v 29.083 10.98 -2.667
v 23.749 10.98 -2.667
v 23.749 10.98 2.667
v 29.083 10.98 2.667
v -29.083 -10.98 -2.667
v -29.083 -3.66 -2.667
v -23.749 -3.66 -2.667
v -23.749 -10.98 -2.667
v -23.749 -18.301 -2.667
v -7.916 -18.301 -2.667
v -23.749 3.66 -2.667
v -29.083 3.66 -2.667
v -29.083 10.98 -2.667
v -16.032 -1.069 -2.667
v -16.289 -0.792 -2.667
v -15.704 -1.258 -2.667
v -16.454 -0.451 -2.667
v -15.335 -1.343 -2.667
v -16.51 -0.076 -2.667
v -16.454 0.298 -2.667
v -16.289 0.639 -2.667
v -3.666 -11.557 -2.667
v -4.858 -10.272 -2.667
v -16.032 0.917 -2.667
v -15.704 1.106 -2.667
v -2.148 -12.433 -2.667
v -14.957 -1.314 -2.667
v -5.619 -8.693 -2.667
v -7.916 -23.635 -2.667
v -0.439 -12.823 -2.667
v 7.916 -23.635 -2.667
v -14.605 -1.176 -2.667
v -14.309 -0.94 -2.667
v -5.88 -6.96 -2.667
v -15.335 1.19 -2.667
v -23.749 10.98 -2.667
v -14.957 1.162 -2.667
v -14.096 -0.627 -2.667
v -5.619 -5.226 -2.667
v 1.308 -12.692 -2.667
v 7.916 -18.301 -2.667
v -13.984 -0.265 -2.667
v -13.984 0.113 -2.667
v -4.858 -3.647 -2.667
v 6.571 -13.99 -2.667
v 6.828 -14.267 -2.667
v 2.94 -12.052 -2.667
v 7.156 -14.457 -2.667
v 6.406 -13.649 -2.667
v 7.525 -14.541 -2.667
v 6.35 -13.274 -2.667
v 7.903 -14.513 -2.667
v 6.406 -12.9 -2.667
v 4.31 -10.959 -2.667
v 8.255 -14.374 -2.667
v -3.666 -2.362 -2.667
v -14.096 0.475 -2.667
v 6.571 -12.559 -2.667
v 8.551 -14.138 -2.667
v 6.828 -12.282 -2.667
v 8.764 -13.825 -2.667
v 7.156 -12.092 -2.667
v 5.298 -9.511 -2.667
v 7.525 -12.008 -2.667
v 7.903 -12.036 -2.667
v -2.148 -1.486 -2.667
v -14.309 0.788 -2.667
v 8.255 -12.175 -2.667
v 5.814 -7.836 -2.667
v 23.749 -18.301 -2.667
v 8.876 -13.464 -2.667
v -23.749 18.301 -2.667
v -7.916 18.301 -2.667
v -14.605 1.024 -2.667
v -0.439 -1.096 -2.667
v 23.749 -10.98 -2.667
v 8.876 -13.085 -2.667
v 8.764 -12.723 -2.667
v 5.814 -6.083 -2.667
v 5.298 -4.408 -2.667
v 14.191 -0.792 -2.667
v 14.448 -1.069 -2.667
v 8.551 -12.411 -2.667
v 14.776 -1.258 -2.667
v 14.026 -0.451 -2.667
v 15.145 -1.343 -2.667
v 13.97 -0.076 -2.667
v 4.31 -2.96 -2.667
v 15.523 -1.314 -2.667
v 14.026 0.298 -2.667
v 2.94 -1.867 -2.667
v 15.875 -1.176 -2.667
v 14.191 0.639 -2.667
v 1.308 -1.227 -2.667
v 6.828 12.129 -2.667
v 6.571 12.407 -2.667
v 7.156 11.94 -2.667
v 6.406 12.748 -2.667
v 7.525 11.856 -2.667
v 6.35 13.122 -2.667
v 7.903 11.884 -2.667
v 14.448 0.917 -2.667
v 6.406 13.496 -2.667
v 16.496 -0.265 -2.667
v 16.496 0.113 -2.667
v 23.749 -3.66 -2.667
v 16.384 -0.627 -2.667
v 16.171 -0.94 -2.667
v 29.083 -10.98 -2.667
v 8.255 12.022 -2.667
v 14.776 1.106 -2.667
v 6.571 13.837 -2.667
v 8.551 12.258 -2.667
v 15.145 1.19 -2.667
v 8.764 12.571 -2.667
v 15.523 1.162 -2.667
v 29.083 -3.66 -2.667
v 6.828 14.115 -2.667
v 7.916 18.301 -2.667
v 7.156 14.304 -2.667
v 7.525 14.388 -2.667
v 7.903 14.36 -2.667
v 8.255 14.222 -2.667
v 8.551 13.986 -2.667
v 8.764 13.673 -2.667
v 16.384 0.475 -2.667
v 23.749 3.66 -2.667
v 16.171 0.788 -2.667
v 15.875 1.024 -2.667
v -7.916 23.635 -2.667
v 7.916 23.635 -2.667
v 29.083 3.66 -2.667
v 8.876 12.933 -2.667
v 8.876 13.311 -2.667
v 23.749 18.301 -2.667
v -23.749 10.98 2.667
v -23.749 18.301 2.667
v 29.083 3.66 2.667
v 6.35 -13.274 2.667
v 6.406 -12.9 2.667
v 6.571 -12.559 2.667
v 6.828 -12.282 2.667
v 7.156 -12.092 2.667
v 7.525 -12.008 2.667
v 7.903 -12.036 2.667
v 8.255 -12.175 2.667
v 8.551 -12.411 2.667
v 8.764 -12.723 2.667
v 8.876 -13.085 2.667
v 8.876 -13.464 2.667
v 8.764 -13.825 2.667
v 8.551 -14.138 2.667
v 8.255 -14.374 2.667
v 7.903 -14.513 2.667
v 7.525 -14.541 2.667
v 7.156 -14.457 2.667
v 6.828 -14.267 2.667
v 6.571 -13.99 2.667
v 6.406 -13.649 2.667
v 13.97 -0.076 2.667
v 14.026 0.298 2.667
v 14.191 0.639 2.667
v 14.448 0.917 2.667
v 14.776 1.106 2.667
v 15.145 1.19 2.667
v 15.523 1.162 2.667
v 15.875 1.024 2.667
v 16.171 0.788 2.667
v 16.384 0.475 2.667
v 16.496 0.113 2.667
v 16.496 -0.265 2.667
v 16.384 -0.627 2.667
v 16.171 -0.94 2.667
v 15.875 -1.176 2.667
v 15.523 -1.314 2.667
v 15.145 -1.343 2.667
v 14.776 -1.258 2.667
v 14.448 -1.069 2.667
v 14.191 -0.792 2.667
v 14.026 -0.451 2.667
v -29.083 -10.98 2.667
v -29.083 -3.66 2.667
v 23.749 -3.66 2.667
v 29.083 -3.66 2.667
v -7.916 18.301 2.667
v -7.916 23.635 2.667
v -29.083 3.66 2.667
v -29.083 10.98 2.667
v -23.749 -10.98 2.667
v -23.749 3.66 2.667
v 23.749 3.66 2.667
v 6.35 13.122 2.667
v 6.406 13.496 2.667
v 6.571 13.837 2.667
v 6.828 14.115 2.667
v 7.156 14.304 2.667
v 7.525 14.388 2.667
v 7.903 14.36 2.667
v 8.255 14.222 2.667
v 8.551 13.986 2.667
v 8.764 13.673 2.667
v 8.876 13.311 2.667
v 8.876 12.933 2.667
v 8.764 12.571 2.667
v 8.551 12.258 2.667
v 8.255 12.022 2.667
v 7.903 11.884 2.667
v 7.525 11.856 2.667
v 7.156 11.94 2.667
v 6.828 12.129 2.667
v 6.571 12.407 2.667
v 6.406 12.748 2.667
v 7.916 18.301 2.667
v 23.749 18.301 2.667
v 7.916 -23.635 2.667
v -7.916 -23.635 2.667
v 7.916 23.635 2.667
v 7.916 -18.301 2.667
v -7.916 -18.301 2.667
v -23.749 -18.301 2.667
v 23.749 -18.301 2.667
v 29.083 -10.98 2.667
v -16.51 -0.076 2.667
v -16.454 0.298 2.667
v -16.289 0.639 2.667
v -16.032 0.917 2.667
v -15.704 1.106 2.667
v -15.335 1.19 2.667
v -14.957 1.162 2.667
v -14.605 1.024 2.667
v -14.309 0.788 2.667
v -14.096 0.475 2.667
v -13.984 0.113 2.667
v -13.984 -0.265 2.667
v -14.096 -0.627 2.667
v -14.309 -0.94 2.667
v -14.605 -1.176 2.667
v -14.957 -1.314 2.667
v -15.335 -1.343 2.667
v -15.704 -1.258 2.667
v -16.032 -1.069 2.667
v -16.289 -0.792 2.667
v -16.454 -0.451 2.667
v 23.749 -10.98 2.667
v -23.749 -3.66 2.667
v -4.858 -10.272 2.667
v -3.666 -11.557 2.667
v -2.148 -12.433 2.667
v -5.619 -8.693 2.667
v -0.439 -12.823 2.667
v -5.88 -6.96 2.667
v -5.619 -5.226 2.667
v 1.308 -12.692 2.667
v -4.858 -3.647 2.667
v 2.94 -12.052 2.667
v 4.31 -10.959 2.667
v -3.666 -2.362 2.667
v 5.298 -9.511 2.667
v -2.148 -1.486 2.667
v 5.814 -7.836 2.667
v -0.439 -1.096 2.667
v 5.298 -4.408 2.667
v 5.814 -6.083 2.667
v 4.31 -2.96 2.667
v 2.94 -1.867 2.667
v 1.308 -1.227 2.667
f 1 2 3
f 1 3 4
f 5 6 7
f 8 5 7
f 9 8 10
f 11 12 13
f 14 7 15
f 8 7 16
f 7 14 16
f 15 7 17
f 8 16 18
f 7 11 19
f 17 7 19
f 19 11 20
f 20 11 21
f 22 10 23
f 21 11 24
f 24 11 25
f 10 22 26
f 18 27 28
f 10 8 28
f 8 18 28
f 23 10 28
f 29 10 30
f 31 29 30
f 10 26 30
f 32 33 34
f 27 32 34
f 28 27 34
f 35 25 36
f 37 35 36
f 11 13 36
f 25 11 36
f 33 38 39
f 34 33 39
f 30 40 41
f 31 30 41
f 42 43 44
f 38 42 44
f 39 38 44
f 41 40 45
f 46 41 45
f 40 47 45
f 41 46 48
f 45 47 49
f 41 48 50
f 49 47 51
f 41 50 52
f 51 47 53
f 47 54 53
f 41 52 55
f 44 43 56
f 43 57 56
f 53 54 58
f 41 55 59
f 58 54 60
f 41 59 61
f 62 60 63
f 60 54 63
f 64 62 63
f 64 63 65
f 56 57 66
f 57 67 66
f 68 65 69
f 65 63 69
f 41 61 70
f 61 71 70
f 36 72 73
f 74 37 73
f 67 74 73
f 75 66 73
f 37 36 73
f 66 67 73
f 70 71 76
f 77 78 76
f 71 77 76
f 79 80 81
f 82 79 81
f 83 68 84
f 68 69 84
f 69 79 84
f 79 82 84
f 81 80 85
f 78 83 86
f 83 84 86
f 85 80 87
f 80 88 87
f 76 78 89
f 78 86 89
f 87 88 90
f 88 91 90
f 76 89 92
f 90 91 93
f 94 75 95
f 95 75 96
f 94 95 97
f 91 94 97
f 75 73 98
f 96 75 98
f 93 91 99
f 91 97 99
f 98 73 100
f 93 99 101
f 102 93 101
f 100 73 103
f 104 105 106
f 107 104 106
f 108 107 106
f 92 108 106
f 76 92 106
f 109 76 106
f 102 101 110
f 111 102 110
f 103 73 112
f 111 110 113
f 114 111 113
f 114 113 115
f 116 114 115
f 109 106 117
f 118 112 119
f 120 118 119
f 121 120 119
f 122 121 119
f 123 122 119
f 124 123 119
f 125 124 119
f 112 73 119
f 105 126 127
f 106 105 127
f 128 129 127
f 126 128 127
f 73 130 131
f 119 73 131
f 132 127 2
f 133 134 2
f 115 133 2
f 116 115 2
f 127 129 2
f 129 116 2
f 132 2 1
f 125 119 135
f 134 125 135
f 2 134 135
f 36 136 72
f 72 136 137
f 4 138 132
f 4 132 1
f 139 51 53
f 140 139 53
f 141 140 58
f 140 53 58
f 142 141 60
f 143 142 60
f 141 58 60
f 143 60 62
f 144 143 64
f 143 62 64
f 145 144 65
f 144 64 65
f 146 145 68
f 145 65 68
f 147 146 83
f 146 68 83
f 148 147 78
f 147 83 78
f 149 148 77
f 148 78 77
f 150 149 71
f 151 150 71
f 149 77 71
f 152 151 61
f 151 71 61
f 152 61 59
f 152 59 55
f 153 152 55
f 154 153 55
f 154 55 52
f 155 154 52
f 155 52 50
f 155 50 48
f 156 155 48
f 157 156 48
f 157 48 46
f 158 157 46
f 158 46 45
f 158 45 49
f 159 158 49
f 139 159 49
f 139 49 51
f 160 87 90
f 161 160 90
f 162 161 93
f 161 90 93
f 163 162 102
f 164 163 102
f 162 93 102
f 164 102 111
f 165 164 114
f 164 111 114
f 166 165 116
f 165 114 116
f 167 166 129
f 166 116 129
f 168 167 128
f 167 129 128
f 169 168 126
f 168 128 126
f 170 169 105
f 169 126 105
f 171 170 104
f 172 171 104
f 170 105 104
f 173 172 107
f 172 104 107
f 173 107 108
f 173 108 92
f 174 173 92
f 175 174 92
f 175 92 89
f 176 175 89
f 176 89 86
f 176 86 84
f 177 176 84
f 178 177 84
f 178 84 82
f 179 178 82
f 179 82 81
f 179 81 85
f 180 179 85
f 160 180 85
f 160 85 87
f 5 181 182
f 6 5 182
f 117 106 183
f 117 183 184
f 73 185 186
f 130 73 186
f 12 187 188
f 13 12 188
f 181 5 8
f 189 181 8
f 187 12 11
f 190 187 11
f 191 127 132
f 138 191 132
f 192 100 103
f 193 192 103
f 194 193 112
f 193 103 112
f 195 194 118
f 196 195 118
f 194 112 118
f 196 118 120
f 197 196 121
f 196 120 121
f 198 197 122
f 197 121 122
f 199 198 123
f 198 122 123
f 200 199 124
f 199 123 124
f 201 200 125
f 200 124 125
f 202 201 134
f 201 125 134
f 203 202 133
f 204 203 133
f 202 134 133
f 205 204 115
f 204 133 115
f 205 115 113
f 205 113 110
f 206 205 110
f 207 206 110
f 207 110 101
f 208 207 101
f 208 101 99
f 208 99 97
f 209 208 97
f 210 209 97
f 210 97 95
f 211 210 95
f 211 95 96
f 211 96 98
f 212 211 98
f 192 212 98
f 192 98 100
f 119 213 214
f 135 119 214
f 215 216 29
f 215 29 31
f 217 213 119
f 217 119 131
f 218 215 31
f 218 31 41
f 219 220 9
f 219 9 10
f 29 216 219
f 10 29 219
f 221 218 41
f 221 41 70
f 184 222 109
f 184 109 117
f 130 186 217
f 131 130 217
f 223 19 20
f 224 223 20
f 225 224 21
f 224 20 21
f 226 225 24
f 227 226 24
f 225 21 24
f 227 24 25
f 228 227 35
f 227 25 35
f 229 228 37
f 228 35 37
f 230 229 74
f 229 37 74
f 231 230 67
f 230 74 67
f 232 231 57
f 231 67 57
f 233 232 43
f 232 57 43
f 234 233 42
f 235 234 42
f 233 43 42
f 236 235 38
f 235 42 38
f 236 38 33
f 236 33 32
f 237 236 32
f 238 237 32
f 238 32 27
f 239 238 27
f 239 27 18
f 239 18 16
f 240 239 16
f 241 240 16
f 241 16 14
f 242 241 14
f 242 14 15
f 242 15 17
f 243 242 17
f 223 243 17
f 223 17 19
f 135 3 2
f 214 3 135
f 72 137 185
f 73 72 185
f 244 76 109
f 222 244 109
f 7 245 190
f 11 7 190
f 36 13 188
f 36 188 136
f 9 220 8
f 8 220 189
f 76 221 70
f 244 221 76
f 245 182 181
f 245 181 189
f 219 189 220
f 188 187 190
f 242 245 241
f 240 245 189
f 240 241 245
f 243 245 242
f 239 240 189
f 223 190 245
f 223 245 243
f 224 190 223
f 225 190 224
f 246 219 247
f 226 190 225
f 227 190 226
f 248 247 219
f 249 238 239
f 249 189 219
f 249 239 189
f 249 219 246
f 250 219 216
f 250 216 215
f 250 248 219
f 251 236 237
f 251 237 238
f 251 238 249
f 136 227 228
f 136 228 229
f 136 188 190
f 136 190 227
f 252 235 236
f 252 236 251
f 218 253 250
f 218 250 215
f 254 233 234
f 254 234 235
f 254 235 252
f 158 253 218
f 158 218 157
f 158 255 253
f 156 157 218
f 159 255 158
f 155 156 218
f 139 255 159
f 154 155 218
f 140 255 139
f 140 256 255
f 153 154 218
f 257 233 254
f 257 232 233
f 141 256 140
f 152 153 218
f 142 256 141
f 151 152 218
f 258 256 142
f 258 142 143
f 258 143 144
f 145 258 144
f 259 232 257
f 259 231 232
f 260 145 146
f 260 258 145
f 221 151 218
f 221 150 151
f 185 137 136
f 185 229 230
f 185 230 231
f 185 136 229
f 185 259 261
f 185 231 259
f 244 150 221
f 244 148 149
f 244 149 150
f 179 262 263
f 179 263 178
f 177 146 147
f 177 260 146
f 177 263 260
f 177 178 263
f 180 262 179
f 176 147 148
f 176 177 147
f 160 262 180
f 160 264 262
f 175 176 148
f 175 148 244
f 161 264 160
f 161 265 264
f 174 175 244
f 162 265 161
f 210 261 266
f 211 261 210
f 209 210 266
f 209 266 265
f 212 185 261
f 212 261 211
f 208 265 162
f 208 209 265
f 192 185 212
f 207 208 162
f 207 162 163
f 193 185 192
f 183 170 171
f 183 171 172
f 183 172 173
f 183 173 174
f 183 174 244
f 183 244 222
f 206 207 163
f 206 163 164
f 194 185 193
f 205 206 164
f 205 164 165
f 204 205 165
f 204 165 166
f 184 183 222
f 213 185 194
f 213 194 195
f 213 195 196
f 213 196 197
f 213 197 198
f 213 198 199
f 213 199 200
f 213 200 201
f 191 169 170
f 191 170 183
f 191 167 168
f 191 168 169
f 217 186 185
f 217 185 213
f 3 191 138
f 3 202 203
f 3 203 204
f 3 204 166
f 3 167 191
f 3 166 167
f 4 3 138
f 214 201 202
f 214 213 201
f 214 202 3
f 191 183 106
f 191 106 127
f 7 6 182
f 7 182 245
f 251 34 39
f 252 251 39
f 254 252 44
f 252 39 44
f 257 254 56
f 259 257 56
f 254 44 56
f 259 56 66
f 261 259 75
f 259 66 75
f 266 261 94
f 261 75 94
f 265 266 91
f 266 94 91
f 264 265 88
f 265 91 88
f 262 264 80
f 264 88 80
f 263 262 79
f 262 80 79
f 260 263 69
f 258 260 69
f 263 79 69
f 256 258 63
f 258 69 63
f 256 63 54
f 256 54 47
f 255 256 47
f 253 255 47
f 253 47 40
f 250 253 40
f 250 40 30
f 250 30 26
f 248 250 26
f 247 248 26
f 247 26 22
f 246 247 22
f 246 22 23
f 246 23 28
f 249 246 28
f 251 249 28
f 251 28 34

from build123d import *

# Parameters (mm, degrees)
SKETCH1_W           = 47.498
SKETCH1_H           = 36.6014
BOSS_EXTRUDE1_DEPTH = 2.667
SKETCH3_W           = 5.334
SKETCH3_H           = 7.32028
BOSS_EXTRUDE3_DEPTH = 5.334
SKETCH5_W           = 15.832666666
SKETCH5_H           = 5.334
BOSS_EXTRUDE4_DEPTH = 5.334
SKETCH6_R           = 1.27
SKETCH6_R_2         = 5.8801
CUT_EXTRUDE1_DEPTH  = 38.853289013


with BuildPart() as part:
    # Sketch1 → Boss-Extrude1 (new, symmetric)
    with BuildSketch(Plane.XY):
        Rectangle(SKETCH1_W, SKETCH1_H)
    extrude(amount=BOSS_EXTRUDE1_DEPTH, both=True)

    # Sketch3 → Boss-Extrude3 (add)
    with BuildSketch(Plane.XY.offset(2.667)):
        with Locations((-26.416, 7.32028)):
            Rectangle(SKETCH3_W, SKETCH3_H)
        with Locations((-26.416, -7.32028)):
            Rectangle(SKETCH3_W, SKETCH3_H)
        with Locations((26.416, -7.32028)):
            Rectangle(SKETCH3_W, SKETCH3_H)
        with Locations((26.416, 7.32028)):
            Rectangle(SKETCH3_W, SKETCH3_H)
    extrude(amount=-BOSS_EXTRUDE3_DEPTH)

    # Sketch5 → Boss-Extrude4 (add)
    with BuildSketch(Plane.XY.offset(2.667)):
        with Locations((0, -20.9677)):
            Rectangle(SKETCH5_W, SKETCH5_H)
        with Locations((0, 20.9677)):
            Rectangle(SKETCH5_W, SKETCH5_H)
    extrude(amount=-BOSS_EXTRUDE4_DEPTH)

    # Sketch6 → Cut-Extrude1 (cut, through all)
    with BuildSketch(Plane(origin=(0, 0, -2.667), x_dir=(-1, 0, 0), z_dir=(0, 0, -1))):
        with Locations((-15.24, -0.0762)):
            Circle(SKETCH6_R)
        with Locations((-7.62, -13.274427096)):
            Circle(SKETCH6_R)
        with Locations((15.24, -0.0762)):
            Circle(SKETCH6_R)
        with Locations((-7.61999995, 13.122027183)):
            Circle(SKETCH6_R)
        with Locations((0, -6.9596)):
            Circle(SKETCH6_R_2)
    extrude(amount=-CUT_EXTRUDE1_DEPTH, mode=Mode.SUBTRACT)


solid = part.part
